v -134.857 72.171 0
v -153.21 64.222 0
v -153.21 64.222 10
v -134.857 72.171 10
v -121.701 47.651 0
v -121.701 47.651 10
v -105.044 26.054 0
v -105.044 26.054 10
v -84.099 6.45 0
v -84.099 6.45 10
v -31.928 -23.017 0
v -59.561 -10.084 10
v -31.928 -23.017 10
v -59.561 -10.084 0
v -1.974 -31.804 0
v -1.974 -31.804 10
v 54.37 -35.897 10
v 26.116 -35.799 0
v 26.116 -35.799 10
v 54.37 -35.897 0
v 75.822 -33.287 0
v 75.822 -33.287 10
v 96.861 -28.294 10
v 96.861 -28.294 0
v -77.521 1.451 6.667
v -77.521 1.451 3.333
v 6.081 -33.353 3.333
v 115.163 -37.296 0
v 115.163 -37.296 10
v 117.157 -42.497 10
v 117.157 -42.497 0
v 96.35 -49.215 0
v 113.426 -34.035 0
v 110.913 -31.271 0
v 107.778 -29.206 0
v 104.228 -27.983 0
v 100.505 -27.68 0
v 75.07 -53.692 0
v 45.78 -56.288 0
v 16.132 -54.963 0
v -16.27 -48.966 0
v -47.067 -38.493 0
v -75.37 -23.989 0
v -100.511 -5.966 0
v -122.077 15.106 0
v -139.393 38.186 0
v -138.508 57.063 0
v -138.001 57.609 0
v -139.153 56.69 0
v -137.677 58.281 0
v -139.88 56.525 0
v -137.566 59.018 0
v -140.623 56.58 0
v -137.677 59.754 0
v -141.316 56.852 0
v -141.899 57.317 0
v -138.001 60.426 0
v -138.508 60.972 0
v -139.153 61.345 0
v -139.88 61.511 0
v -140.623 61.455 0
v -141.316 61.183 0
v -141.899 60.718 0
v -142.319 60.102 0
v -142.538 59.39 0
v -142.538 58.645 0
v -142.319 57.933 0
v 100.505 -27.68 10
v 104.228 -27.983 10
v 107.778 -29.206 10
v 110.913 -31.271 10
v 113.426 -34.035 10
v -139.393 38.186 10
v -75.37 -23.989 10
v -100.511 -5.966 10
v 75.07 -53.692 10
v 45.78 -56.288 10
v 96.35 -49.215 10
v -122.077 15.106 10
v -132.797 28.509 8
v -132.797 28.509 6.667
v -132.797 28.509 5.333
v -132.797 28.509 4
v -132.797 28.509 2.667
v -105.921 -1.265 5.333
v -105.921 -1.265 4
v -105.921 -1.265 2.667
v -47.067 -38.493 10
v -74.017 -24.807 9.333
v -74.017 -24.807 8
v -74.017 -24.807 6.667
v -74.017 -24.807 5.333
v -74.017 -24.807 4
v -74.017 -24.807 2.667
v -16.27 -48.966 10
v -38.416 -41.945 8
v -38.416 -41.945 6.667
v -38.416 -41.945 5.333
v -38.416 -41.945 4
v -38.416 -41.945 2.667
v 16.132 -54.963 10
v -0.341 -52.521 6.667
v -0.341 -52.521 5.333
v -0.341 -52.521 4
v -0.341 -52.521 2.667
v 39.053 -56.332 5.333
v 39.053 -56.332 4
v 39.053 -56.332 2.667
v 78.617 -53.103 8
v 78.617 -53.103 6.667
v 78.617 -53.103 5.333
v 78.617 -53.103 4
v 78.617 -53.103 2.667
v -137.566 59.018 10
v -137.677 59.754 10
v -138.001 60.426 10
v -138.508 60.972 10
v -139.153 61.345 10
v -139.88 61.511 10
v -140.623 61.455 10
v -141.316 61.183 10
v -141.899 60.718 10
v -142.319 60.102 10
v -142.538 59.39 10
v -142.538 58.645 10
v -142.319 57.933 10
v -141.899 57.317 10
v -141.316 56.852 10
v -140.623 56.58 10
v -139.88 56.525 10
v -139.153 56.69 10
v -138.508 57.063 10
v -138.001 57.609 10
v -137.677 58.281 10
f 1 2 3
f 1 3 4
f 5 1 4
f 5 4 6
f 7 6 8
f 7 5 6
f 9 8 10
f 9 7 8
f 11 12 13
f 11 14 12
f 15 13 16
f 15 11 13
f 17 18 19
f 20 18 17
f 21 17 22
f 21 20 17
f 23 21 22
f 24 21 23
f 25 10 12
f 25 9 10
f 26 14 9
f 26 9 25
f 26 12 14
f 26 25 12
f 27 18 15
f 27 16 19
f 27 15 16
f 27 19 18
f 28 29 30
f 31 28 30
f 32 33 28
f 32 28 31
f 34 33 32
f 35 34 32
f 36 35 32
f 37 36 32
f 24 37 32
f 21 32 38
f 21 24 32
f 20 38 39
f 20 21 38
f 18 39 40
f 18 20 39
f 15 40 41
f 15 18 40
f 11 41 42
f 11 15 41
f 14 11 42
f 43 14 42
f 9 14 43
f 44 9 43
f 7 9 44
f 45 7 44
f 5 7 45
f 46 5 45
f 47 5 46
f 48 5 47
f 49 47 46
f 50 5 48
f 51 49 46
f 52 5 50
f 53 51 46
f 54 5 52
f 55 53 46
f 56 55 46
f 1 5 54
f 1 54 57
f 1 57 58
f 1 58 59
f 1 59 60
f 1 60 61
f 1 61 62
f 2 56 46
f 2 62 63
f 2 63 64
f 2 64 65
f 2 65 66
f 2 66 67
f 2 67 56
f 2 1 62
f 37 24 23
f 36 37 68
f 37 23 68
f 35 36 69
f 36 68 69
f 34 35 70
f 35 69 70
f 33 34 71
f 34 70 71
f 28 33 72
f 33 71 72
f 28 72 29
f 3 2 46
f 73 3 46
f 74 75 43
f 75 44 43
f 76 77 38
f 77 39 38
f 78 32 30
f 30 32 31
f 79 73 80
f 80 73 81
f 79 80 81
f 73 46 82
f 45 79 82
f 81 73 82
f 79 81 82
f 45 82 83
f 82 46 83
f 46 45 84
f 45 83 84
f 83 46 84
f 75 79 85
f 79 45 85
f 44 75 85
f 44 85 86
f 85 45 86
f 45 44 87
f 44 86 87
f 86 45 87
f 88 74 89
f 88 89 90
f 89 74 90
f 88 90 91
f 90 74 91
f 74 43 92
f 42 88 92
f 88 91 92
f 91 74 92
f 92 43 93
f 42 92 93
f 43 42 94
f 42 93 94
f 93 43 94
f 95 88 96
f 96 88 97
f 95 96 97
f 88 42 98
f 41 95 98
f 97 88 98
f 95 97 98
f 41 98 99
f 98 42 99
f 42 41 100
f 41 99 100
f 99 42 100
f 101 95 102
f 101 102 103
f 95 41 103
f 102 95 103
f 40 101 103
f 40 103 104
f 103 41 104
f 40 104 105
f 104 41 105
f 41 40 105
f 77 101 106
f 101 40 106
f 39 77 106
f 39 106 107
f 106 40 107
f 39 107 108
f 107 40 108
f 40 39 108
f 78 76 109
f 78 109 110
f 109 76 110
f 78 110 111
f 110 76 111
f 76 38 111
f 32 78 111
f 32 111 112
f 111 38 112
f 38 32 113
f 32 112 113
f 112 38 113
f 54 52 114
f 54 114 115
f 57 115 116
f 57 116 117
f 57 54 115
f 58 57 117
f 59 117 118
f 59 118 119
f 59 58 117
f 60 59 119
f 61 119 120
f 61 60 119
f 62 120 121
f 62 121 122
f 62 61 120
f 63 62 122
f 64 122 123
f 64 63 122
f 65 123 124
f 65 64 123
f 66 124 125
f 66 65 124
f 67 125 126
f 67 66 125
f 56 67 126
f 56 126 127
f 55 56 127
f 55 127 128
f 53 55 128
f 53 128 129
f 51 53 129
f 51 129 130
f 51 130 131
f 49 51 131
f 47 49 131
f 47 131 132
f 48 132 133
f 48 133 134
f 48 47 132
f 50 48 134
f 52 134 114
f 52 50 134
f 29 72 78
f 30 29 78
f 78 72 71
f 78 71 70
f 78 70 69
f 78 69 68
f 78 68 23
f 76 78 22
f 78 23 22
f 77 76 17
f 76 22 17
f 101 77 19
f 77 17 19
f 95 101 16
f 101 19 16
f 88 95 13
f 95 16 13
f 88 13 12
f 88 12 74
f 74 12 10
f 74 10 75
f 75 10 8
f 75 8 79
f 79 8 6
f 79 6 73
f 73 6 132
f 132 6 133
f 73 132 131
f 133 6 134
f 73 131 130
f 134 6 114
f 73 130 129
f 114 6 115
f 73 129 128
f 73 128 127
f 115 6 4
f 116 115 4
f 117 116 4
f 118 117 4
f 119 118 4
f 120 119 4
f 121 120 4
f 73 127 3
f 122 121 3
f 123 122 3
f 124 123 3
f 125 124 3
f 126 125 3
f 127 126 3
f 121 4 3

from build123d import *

# Parameters (mm, degrees)
SKETCH1_R           = 2.5
BOSS_EXTRUDE1_DEPTH = 10
FILLET1_R           = 15


with BuildPart() as part:
    # Sketch1 → Boss-Extrude1 (new body)
    with BuildSketch(Plane.XY):
        with BuildLine():
            Line((-153.209844122, 64.22227218), (-134.857466087, 72.171499844))
            add(Edge.make_bspline(
                [(-134.857466087, 72.171499844), (-95.112786079, -19.587023525), (19.679963539, -58.443680936), (109.998130478, -23.821920924)],
                knots=[0, 0, 0, 0, 1, 1, 1, 1], degree=3))
            Line((109.998130478, -23.821920924), (117.156813937, -42.496857366))
            add(Edge.make_bspline(
                [(-153.209844122, 64.22227218), (-151.826469152, 61.02847506), (-148.868667036, 54.694552651), (-142.349662301, 42.556362443), (-133.066091683, 28.258999789), (-120.314236403, 12.602461078), (-106.129642392, -1.524838982), (-90.691829348, -14.090513707), (-68.663135829, -28.734465967), (-38.826934331, -43.036898498), (-0.560107528, -53.64668274), (32.42612627, -56.860637918), (58.90387557, -55.916919646), (78.65907651, -53.410100787), (94.913282093, -49.78386899), (107.704978524, -45.940359032), (114.029028194, -43.695834837), (117.156813937, -42.496857366)],
                knots=[0, 0, 0, 0, 0.03125, 0.0625, 0.125, 0.1875, 0.25, 0.3125, 0.375, 0.5, 0.625, 0.75, 0.8125, 0.875, 0.9375, 0.96875, 1, 1, 1, 1], degree=3))
        make_face()
        with Locations((-140.066359364, 59.017527205)):
            Circle(SKETCH1_R, mode=Mode.SUBTRACT)
    extrude(amount=BOSS_EXTRUDE1_DEPTH)

    # Fillet1
    fillet1_edges = [part.edges().sort_by_distance(p)[0] for p in [
        (109.998130478, -23.821920924, 5),
    ]]
    fillet(fillet1_edges, radius=FILLET1_R)


solid = part.part
